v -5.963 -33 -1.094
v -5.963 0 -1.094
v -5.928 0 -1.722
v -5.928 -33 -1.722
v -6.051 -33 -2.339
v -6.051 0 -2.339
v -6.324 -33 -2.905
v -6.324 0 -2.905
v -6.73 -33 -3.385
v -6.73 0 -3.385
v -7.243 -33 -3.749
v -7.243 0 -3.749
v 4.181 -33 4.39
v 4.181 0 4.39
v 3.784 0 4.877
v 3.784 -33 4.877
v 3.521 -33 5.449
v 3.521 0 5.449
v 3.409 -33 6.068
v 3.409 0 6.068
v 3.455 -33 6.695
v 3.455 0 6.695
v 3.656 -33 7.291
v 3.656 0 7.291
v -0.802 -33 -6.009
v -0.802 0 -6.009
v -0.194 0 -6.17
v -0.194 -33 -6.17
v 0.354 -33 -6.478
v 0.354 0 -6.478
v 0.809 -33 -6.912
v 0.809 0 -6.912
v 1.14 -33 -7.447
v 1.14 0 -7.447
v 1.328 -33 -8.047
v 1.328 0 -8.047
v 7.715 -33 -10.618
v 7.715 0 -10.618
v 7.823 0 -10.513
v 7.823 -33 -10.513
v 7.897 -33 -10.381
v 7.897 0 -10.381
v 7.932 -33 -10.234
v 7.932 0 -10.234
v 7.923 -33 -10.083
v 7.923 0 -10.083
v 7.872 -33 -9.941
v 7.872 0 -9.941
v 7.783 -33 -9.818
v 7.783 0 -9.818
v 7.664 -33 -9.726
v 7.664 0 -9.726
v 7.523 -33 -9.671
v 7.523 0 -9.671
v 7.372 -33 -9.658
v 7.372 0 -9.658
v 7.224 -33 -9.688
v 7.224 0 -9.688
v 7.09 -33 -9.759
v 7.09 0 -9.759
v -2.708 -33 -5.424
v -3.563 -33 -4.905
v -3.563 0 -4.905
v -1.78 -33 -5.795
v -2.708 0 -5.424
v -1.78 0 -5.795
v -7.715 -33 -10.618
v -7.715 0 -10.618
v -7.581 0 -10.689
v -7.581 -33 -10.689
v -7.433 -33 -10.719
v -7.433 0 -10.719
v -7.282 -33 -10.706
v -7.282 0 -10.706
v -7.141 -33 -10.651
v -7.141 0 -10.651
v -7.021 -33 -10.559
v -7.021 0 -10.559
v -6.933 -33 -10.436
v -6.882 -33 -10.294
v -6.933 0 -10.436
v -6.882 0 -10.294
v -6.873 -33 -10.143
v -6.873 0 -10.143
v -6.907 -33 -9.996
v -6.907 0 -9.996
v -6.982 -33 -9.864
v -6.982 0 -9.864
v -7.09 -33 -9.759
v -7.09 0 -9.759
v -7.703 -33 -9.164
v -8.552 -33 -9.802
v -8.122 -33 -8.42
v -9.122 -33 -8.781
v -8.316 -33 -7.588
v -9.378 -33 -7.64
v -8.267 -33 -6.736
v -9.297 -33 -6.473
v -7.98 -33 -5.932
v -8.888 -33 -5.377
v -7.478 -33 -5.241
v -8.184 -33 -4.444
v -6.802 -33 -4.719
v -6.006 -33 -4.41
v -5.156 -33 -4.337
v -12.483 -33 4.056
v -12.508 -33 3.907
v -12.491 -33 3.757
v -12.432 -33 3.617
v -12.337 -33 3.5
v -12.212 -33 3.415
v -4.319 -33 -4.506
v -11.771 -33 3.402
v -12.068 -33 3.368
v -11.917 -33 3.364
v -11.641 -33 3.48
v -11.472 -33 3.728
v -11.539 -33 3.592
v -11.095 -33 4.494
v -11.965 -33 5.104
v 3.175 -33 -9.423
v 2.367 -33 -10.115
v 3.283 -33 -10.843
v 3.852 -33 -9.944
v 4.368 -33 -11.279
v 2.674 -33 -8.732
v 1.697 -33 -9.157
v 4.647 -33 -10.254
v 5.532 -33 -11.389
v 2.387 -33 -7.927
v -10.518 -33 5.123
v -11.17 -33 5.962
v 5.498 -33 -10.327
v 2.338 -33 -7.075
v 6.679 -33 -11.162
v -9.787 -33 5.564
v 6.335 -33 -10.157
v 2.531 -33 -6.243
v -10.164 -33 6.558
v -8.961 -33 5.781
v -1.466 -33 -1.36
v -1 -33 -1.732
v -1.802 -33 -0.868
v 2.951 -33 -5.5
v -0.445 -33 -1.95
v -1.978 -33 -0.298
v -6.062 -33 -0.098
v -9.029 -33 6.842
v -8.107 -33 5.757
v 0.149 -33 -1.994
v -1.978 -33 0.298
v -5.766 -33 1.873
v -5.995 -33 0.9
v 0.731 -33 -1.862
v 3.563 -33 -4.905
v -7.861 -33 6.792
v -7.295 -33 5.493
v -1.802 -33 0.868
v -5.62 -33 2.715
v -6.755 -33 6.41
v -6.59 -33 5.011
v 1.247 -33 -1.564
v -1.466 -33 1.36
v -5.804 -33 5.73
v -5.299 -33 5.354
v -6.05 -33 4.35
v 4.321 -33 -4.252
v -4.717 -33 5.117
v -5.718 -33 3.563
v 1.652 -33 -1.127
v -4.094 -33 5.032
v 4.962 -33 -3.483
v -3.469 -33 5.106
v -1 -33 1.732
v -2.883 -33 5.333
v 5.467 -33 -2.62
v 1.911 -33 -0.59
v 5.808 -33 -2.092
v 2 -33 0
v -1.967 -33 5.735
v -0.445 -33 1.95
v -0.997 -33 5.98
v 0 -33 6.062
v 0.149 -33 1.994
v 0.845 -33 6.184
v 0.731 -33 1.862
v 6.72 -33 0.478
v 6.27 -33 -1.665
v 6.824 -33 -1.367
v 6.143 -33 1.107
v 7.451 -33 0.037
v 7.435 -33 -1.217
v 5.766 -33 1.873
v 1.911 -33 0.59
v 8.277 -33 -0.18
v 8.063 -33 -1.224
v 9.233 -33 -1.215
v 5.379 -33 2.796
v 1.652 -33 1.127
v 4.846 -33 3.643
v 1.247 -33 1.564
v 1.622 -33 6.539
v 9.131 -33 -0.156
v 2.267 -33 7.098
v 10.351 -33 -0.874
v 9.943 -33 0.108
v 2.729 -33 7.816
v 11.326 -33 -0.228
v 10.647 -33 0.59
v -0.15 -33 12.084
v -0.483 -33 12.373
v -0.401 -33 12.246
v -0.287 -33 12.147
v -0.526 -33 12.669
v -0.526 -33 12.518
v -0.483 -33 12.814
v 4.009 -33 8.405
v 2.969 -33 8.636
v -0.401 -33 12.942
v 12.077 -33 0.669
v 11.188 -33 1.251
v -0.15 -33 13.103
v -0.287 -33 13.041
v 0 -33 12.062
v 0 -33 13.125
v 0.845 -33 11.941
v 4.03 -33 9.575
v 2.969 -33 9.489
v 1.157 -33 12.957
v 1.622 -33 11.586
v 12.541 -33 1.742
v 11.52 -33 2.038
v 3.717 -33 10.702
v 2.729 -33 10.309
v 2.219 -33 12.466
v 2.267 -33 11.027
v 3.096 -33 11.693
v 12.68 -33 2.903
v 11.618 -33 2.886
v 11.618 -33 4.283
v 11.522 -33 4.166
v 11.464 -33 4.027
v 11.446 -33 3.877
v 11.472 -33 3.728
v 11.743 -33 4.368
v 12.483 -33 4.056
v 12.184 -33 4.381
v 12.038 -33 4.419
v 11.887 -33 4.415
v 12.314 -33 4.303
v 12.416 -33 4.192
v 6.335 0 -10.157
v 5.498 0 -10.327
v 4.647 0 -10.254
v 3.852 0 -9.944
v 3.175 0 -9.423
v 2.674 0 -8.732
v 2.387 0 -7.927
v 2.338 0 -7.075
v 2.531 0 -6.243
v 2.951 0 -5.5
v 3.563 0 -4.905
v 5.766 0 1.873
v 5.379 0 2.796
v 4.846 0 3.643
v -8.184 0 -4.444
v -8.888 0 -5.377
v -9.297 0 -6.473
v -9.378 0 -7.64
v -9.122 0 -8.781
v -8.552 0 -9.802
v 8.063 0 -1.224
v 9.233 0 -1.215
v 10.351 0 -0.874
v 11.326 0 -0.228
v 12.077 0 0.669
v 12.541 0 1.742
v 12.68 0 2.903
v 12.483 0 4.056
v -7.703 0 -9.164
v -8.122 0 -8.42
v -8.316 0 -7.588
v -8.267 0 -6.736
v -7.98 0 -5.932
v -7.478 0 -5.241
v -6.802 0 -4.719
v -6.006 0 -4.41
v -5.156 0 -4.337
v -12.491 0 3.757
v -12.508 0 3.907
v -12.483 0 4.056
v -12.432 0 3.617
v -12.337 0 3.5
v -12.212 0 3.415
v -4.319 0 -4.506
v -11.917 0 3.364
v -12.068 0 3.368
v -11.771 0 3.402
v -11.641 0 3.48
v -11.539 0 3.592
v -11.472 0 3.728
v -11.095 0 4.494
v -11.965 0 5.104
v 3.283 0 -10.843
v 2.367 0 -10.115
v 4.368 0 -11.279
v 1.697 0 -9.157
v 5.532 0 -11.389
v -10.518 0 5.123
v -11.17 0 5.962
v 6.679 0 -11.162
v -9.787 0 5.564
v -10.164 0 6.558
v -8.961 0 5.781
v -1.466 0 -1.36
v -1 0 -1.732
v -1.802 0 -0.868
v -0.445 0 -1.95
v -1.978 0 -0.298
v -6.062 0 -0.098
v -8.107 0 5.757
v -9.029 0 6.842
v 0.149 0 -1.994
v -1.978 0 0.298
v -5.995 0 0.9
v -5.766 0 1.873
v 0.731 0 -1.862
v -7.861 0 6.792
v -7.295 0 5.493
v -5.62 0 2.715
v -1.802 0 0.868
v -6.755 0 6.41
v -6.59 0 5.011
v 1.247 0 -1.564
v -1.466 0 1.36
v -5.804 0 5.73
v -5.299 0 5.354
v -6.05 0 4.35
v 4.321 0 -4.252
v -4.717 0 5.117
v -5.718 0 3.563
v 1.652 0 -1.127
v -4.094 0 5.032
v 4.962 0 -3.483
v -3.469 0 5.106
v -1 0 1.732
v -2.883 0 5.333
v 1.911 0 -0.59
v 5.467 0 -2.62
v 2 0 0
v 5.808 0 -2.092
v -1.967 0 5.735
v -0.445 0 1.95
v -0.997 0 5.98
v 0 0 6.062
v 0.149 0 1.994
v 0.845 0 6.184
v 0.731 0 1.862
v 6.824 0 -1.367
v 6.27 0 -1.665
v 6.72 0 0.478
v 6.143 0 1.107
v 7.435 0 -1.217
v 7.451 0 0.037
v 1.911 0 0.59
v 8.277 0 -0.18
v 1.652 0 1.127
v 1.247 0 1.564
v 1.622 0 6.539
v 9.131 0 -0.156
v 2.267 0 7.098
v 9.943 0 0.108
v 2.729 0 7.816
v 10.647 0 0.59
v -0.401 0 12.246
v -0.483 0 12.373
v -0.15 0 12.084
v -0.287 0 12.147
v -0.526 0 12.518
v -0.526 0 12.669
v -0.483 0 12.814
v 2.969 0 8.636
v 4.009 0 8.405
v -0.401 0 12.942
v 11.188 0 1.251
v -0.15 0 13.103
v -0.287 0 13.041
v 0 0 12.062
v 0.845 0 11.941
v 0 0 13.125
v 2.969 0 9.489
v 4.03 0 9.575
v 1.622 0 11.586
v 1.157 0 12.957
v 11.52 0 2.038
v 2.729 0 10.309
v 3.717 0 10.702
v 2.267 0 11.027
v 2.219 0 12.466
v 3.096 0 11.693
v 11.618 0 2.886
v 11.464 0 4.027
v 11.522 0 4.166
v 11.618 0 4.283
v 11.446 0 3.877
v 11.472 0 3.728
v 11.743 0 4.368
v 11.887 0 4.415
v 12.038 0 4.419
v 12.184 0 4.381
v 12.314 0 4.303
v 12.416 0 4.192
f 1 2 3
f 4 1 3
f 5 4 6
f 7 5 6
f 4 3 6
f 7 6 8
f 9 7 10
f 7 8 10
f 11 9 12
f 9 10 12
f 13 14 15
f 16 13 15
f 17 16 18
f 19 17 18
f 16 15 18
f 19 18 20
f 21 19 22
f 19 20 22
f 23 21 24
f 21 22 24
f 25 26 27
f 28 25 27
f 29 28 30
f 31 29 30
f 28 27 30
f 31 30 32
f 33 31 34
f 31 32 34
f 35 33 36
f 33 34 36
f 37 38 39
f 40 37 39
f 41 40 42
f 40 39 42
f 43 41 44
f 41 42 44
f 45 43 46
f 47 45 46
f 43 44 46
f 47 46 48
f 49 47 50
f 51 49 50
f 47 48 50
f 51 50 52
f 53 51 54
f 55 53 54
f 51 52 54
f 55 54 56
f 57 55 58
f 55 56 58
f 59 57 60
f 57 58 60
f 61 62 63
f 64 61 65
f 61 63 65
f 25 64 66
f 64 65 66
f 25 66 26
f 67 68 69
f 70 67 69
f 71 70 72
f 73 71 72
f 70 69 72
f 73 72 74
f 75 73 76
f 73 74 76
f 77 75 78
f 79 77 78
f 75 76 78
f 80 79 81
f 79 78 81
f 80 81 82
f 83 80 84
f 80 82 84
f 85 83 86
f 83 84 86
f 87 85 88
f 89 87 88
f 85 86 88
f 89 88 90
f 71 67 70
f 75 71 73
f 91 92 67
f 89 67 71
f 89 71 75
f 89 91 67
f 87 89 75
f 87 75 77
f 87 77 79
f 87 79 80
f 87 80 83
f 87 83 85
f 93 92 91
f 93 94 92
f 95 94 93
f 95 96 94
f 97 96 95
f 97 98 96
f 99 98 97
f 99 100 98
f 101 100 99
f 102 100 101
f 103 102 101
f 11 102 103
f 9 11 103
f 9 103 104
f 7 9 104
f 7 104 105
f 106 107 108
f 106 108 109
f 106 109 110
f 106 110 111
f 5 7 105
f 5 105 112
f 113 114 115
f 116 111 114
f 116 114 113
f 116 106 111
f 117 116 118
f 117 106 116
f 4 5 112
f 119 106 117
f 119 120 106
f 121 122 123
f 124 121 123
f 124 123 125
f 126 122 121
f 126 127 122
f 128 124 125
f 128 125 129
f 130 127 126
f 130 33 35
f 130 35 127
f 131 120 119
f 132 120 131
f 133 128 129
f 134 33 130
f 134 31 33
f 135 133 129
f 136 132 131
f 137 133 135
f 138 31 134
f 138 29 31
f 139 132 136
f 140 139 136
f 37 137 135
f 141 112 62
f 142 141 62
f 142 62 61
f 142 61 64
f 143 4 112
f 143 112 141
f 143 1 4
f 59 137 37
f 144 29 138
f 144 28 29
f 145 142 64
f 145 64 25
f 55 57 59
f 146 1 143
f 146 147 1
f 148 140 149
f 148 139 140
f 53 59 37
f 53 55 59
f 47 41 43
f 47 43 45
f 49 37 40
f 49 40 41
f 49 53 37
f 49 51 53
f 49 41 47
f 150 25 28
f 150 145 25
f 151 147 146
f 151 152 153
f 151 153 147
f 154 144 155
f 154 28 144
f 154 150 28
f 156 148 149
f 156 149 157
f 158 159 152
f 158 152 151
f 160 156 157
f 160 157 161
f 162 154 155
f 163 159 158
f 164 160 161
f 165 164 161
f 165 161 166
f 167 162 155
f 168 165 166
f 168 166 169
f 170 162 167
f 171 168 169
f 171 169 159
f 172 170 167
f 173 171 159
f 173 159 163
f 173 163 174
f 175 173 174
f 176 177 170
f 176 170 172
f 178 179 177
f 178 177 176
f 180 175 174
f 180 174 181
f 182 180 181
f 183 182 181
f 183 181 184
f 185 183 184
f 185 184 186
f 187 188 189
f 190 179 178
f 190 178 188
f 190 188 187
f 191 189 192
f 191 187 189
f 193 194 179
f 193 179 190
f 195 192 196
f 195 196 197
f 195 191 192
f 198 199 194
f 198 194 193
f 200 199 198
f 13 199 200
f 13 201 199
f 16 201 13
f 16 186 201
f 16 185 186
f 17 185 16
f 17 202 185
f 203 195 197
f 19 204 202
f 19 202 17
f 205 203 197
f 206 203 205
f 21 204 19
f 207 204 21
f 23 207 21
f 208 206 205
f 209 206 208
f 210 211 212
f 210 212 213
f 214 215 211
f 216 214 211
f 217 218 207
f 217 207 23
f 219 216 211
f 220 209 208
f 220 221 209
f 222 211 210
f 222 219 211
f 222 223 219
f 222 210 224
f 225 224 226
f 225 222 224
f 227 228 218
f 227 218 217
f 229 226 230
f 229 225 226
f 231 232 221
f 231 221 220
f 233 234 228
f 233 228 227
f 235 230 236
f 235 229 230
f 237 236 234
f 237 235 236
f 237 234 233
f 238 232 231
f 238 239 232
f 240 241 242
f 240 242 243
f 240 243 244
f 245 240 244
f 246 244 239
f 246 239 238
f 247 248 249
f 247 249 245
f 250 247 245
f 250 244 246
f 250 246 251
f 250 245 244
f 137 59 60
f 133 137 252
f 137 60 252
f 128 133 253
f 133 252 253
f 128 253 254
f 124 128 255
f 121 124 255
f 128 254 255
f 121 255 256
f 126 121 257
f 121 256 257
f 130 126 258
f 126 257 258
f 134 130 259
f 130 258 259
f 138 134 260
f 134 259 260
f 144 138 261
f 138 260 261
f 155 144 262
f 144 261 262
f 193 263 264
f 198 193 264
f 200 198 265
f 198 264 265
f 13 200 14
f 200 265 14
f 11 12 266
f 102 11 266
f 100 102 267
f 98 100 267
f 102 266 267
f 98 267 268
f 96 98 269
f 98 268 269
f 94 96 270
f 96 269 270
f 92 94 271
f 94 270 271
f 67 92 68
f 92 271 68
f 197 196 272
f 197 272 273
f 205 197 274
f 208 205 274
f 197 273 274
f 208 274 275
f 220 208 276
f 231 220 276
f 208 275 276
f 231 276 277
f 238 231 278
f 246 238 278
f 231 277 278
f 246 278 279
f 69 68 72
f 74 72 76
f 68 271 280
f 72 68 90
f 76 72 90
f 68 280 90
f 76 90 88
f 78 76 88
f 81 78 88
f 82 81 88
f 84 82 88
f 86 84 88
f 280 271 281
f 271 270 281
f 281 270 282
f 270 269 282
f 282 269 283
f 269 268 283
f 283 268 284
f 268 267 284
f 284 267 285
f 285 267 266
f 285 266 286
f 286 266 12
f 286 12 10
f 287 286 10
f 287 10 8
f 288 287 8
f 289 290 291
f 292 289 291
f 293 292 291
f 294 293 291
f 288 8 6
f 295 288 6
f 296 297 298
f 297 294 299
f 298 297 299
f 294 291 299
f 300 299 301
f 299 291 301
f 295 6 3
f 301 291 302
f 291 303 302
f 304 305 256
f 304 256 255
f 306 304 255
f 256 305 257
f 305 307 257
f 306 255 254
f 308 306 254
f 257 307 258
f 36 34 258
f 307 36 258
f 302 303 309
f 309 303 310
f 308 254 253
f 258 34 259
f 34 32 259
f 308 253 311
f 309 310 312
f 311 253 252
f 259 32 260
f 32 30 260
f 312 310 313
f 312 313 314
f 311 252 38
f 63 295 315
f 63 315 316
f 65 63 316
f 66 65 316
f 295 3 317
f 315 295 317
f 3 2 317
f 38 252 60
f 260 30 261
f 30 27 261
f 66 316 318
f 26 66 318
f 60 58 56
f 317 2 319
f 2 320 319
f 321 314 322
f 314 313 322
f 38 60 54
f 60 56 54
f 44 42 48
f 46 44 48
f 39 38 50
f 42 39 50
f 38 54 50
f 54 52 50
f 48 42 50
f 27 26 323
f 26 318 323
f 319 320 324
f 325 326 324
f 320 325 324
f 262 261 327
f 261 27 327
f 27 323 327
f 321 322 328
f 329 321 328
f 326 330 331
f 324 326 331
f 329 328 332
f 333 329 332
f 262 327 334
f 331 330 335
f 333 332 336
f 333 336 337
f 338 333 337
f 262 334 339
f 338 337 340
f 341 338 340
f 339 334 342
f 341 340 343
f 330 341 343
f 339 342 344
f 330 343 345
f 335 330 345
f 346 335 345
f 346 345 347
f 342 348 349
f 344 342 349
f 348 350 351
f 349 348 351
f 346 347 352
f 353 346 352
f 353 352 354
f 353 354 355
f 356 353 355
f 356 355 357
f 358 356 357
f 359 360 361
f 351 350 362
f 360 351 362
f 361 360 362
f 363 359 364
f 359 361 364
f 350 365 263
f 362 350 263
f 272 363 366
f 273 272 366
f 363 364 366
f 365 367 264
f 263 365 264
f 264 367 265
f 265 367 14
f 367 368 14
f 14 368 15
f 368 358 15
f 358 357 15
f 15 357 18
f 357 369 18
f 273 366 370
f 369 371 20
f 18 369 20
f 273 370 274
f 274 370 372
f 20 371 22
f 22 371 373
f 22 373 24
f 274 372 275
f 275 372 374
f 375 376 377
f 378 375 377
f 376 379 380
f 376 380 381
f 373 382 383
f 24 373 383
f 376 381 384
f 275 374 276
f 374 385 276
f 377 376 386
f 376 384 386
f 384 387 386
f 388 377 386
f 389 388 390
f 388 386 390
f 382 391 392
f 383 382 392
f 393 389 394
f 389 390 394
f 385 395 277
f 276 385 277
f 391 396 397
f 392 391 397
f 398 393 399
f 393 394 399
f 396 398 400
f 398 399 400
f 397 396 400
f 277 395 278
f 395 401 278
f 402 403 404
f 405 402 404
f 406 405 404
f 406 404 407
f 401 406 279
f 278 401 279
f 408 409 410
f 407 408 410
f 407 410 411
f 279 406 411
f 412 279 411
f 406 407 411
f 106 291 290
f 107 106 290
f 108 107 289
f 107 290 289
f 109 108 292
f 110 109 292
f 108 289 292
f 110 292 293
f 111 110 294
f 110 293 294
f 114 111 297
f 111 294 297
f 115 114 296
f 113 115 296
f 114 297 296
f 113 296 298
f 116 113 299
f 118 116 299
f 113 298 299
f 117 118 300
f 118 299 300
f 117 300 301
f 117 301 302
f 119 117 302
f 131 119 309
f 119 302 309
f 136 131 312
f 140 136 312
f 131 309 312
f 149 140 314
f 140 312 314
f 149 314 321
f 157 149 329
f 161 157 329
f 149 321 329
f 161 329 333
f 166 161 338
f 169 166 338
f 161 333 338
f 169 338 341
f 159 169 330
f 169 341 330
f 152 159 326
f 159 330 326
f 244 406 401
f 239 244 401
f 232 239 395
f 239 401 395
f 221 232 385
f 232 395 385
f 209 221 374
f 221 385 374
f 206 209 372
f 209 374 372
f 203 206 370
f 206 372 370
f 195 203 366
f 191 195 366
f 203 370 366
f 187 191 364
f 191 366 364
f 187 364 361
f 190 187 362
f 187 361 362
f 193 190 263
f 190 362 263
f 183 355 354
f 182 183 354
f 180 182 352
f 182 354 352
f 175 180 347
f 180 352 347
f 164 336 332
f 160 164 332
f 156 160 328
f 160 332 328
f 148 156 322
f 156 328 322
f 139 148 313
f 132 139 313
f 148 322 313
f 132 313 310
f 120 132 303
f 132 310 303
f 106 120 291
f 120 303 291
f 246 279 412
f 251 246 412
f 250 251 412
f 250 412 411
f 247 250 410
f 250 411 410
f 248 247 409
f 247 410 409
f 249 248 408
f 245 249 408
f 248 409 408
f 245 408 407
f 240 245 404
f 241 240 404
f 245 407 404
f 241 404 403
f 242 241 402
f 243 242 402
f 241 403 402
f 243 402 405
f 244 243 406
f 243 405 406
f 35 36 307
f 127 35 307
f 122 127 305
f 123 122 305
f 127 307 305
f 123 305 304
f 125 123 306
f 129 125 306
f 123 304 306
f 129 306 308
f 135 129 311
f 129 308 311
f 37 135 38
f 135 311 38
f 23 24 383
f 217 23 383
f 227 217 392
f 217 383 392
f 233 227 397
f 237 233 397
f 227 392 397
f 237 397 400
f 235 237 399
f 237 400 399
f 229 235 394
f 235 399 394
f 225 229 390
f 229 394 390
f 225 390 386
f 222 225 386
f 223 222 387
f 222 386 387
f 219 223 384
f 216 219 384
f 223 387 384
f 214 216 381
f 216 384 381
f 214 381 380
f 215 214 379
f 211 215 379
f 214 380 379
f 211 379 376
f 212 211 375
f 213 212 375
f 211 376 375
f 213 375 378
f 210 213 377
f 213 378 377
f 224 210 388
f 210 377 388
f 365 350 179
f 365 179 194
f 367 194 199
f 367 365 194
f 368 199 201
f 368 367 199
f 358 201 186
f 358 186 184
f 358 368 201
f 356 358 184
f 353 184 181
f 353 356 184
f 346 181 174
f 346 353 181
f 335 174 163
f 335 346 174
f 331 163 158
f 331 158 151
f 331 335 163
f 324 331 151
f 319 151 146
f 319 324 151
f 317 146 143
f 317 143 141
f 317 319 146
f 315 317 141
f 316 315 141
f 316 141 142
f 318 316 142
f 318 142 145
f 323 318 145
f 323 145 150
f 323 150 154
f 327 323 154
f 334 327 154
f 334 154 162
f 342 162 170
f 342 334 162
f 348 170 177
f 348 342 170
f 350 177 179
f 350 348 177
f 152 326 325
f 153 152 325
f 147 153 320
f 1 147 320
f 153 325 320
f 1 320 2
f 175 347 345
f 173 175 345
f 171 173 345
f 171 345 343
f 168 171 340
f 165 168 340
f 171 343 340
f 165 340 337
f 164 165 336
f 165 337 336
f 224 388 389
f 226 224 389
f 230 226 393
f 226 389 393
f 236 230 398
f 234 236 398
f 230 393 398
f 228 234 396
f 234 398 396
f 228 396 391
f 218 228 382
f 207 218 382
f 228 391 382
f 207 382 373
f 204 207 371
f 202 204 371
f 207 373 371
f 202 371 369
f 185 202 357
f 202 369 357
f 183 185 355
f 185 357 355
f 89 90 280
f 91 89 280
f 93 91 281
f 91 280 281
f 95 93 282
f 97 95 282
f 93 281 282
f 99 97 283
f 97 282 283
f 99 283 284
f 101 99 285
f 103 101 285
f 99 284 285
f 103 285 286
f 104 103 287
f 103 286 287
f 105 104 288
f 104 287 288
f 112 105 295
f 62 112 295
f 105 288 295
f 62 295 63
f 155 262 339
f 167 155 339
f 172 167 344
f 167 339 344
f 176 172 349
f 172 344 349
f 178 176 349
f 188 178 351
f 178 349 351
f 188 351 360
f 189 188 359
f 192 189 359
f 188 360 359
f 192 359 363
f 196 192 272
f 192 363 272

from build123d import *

# Parameters (mm, degrees)
F0_R     = 2
F1_DEPTH = 33


with BuildPart() as f1:
    # F0 (on Front) → F1 (new body)
    with BuildSketch(Plane.XZ):
        with BuildLine():
            ThreePointArc((0, 12.0625), (3, 9.0625), (0, 6.0625))
            ThreePointArc((0, 6.0625), (-1.486924, 5.877326), (-2.883015, 5.333117))
            ThreePointArc((-2.883015, 5.333117), (-4.408233, 5.055069), (-5.804101, 5.729721))
            ThreePointArc((-5.804101, 5.729721), (-9.606608, 6.74108), (-12.482617, 4.055848))
            ThreePointArc((-12.482617, 4.055848), (-12.141533, 3.386434), (-11.472119, 3.727517))
            ThreePointArc((-11.472119, 3.727517), (-7.691899, 5.653636), (-5.76578, 1.873416))
            ThreePointArc((-5.76578, 1.873416), (-6.049154, 0.402045), (-5.962996, -1.093886))
            ThreePointArc((-5.962996, -1.093886), (-6.169875, -2.630377), (-7.242855, -3.749447))
            ThreePointArc((-7.242855, -3.749447), (-9.379753, -7.053318), (-7.714681, -10.618348))
            ThreePointArc((-7.714681, -10.618348), (-6.97263, -10.500819), (-7.09016, -9.758767))
            ThreePointArc((-7.09016, -9.758767), (-7.753855, -5.568361), (-3.563448, -4.904666))
            ThreePointArc((-3.563448, -4.904666), (-2.251659, -5.628849), (-0.802319, -6.009175))
            ThreePointArc((-0.802319, -6.009175), (0.595041, -6.680731), (1.327771, -8.047007))
            ThreePointArc((1.327771, -8.047007), (3.809601, -11.100271), (7.714681, -10.618348))
            ThreePointArc((7.714681, -10.618348), (7.832211, -9.876297), (7.09016, -9.758767))
            ThreePointArc((7.09016, -9.758767), (2.899753, -9.095072), (3.563448, -4.904666))
            ThreePointArc((3.563448, -4.904666), (4.657553, -3.880865), (5.467135, -2.619988))
            ThreePointArc((5.467135, -2.619988), (6.537631, -1.498542), (8.063462, -1.223877))
            ThreePointArc((8.063462, -1.223877), (11.734216, 0.192974), (12.482617, 4.055848))
            ThreePointArc((12.482617, 4.055848), (11.813203, 4.396932), (11.472119, 3.727517))
            ThreePointArc((11.472119, 3.727517), (9.546001, -0.052703), (5.76578, 1.873416))
            ThreePointArc((5.76578, 1.873416), (5.130184, 3.230343), (4.181195, 4.389934))
            ThreePointArc((4.181195, 4.389934), (3.445437, 5.754581), (3.655723, 7.29061))
            ThreePointArc((3.655723, 7.29061), (3.442543, 11.219535), (0, 13.125))
            ThreePointArc((0, 13.125), (-0.53125, 12.59375), (0, 12.0625))
        make_face()
        Circle(F0_R, mode=Mode.SUBTRACT)
    extrude(amount=F1_DEPTH)


solid = f1.part
